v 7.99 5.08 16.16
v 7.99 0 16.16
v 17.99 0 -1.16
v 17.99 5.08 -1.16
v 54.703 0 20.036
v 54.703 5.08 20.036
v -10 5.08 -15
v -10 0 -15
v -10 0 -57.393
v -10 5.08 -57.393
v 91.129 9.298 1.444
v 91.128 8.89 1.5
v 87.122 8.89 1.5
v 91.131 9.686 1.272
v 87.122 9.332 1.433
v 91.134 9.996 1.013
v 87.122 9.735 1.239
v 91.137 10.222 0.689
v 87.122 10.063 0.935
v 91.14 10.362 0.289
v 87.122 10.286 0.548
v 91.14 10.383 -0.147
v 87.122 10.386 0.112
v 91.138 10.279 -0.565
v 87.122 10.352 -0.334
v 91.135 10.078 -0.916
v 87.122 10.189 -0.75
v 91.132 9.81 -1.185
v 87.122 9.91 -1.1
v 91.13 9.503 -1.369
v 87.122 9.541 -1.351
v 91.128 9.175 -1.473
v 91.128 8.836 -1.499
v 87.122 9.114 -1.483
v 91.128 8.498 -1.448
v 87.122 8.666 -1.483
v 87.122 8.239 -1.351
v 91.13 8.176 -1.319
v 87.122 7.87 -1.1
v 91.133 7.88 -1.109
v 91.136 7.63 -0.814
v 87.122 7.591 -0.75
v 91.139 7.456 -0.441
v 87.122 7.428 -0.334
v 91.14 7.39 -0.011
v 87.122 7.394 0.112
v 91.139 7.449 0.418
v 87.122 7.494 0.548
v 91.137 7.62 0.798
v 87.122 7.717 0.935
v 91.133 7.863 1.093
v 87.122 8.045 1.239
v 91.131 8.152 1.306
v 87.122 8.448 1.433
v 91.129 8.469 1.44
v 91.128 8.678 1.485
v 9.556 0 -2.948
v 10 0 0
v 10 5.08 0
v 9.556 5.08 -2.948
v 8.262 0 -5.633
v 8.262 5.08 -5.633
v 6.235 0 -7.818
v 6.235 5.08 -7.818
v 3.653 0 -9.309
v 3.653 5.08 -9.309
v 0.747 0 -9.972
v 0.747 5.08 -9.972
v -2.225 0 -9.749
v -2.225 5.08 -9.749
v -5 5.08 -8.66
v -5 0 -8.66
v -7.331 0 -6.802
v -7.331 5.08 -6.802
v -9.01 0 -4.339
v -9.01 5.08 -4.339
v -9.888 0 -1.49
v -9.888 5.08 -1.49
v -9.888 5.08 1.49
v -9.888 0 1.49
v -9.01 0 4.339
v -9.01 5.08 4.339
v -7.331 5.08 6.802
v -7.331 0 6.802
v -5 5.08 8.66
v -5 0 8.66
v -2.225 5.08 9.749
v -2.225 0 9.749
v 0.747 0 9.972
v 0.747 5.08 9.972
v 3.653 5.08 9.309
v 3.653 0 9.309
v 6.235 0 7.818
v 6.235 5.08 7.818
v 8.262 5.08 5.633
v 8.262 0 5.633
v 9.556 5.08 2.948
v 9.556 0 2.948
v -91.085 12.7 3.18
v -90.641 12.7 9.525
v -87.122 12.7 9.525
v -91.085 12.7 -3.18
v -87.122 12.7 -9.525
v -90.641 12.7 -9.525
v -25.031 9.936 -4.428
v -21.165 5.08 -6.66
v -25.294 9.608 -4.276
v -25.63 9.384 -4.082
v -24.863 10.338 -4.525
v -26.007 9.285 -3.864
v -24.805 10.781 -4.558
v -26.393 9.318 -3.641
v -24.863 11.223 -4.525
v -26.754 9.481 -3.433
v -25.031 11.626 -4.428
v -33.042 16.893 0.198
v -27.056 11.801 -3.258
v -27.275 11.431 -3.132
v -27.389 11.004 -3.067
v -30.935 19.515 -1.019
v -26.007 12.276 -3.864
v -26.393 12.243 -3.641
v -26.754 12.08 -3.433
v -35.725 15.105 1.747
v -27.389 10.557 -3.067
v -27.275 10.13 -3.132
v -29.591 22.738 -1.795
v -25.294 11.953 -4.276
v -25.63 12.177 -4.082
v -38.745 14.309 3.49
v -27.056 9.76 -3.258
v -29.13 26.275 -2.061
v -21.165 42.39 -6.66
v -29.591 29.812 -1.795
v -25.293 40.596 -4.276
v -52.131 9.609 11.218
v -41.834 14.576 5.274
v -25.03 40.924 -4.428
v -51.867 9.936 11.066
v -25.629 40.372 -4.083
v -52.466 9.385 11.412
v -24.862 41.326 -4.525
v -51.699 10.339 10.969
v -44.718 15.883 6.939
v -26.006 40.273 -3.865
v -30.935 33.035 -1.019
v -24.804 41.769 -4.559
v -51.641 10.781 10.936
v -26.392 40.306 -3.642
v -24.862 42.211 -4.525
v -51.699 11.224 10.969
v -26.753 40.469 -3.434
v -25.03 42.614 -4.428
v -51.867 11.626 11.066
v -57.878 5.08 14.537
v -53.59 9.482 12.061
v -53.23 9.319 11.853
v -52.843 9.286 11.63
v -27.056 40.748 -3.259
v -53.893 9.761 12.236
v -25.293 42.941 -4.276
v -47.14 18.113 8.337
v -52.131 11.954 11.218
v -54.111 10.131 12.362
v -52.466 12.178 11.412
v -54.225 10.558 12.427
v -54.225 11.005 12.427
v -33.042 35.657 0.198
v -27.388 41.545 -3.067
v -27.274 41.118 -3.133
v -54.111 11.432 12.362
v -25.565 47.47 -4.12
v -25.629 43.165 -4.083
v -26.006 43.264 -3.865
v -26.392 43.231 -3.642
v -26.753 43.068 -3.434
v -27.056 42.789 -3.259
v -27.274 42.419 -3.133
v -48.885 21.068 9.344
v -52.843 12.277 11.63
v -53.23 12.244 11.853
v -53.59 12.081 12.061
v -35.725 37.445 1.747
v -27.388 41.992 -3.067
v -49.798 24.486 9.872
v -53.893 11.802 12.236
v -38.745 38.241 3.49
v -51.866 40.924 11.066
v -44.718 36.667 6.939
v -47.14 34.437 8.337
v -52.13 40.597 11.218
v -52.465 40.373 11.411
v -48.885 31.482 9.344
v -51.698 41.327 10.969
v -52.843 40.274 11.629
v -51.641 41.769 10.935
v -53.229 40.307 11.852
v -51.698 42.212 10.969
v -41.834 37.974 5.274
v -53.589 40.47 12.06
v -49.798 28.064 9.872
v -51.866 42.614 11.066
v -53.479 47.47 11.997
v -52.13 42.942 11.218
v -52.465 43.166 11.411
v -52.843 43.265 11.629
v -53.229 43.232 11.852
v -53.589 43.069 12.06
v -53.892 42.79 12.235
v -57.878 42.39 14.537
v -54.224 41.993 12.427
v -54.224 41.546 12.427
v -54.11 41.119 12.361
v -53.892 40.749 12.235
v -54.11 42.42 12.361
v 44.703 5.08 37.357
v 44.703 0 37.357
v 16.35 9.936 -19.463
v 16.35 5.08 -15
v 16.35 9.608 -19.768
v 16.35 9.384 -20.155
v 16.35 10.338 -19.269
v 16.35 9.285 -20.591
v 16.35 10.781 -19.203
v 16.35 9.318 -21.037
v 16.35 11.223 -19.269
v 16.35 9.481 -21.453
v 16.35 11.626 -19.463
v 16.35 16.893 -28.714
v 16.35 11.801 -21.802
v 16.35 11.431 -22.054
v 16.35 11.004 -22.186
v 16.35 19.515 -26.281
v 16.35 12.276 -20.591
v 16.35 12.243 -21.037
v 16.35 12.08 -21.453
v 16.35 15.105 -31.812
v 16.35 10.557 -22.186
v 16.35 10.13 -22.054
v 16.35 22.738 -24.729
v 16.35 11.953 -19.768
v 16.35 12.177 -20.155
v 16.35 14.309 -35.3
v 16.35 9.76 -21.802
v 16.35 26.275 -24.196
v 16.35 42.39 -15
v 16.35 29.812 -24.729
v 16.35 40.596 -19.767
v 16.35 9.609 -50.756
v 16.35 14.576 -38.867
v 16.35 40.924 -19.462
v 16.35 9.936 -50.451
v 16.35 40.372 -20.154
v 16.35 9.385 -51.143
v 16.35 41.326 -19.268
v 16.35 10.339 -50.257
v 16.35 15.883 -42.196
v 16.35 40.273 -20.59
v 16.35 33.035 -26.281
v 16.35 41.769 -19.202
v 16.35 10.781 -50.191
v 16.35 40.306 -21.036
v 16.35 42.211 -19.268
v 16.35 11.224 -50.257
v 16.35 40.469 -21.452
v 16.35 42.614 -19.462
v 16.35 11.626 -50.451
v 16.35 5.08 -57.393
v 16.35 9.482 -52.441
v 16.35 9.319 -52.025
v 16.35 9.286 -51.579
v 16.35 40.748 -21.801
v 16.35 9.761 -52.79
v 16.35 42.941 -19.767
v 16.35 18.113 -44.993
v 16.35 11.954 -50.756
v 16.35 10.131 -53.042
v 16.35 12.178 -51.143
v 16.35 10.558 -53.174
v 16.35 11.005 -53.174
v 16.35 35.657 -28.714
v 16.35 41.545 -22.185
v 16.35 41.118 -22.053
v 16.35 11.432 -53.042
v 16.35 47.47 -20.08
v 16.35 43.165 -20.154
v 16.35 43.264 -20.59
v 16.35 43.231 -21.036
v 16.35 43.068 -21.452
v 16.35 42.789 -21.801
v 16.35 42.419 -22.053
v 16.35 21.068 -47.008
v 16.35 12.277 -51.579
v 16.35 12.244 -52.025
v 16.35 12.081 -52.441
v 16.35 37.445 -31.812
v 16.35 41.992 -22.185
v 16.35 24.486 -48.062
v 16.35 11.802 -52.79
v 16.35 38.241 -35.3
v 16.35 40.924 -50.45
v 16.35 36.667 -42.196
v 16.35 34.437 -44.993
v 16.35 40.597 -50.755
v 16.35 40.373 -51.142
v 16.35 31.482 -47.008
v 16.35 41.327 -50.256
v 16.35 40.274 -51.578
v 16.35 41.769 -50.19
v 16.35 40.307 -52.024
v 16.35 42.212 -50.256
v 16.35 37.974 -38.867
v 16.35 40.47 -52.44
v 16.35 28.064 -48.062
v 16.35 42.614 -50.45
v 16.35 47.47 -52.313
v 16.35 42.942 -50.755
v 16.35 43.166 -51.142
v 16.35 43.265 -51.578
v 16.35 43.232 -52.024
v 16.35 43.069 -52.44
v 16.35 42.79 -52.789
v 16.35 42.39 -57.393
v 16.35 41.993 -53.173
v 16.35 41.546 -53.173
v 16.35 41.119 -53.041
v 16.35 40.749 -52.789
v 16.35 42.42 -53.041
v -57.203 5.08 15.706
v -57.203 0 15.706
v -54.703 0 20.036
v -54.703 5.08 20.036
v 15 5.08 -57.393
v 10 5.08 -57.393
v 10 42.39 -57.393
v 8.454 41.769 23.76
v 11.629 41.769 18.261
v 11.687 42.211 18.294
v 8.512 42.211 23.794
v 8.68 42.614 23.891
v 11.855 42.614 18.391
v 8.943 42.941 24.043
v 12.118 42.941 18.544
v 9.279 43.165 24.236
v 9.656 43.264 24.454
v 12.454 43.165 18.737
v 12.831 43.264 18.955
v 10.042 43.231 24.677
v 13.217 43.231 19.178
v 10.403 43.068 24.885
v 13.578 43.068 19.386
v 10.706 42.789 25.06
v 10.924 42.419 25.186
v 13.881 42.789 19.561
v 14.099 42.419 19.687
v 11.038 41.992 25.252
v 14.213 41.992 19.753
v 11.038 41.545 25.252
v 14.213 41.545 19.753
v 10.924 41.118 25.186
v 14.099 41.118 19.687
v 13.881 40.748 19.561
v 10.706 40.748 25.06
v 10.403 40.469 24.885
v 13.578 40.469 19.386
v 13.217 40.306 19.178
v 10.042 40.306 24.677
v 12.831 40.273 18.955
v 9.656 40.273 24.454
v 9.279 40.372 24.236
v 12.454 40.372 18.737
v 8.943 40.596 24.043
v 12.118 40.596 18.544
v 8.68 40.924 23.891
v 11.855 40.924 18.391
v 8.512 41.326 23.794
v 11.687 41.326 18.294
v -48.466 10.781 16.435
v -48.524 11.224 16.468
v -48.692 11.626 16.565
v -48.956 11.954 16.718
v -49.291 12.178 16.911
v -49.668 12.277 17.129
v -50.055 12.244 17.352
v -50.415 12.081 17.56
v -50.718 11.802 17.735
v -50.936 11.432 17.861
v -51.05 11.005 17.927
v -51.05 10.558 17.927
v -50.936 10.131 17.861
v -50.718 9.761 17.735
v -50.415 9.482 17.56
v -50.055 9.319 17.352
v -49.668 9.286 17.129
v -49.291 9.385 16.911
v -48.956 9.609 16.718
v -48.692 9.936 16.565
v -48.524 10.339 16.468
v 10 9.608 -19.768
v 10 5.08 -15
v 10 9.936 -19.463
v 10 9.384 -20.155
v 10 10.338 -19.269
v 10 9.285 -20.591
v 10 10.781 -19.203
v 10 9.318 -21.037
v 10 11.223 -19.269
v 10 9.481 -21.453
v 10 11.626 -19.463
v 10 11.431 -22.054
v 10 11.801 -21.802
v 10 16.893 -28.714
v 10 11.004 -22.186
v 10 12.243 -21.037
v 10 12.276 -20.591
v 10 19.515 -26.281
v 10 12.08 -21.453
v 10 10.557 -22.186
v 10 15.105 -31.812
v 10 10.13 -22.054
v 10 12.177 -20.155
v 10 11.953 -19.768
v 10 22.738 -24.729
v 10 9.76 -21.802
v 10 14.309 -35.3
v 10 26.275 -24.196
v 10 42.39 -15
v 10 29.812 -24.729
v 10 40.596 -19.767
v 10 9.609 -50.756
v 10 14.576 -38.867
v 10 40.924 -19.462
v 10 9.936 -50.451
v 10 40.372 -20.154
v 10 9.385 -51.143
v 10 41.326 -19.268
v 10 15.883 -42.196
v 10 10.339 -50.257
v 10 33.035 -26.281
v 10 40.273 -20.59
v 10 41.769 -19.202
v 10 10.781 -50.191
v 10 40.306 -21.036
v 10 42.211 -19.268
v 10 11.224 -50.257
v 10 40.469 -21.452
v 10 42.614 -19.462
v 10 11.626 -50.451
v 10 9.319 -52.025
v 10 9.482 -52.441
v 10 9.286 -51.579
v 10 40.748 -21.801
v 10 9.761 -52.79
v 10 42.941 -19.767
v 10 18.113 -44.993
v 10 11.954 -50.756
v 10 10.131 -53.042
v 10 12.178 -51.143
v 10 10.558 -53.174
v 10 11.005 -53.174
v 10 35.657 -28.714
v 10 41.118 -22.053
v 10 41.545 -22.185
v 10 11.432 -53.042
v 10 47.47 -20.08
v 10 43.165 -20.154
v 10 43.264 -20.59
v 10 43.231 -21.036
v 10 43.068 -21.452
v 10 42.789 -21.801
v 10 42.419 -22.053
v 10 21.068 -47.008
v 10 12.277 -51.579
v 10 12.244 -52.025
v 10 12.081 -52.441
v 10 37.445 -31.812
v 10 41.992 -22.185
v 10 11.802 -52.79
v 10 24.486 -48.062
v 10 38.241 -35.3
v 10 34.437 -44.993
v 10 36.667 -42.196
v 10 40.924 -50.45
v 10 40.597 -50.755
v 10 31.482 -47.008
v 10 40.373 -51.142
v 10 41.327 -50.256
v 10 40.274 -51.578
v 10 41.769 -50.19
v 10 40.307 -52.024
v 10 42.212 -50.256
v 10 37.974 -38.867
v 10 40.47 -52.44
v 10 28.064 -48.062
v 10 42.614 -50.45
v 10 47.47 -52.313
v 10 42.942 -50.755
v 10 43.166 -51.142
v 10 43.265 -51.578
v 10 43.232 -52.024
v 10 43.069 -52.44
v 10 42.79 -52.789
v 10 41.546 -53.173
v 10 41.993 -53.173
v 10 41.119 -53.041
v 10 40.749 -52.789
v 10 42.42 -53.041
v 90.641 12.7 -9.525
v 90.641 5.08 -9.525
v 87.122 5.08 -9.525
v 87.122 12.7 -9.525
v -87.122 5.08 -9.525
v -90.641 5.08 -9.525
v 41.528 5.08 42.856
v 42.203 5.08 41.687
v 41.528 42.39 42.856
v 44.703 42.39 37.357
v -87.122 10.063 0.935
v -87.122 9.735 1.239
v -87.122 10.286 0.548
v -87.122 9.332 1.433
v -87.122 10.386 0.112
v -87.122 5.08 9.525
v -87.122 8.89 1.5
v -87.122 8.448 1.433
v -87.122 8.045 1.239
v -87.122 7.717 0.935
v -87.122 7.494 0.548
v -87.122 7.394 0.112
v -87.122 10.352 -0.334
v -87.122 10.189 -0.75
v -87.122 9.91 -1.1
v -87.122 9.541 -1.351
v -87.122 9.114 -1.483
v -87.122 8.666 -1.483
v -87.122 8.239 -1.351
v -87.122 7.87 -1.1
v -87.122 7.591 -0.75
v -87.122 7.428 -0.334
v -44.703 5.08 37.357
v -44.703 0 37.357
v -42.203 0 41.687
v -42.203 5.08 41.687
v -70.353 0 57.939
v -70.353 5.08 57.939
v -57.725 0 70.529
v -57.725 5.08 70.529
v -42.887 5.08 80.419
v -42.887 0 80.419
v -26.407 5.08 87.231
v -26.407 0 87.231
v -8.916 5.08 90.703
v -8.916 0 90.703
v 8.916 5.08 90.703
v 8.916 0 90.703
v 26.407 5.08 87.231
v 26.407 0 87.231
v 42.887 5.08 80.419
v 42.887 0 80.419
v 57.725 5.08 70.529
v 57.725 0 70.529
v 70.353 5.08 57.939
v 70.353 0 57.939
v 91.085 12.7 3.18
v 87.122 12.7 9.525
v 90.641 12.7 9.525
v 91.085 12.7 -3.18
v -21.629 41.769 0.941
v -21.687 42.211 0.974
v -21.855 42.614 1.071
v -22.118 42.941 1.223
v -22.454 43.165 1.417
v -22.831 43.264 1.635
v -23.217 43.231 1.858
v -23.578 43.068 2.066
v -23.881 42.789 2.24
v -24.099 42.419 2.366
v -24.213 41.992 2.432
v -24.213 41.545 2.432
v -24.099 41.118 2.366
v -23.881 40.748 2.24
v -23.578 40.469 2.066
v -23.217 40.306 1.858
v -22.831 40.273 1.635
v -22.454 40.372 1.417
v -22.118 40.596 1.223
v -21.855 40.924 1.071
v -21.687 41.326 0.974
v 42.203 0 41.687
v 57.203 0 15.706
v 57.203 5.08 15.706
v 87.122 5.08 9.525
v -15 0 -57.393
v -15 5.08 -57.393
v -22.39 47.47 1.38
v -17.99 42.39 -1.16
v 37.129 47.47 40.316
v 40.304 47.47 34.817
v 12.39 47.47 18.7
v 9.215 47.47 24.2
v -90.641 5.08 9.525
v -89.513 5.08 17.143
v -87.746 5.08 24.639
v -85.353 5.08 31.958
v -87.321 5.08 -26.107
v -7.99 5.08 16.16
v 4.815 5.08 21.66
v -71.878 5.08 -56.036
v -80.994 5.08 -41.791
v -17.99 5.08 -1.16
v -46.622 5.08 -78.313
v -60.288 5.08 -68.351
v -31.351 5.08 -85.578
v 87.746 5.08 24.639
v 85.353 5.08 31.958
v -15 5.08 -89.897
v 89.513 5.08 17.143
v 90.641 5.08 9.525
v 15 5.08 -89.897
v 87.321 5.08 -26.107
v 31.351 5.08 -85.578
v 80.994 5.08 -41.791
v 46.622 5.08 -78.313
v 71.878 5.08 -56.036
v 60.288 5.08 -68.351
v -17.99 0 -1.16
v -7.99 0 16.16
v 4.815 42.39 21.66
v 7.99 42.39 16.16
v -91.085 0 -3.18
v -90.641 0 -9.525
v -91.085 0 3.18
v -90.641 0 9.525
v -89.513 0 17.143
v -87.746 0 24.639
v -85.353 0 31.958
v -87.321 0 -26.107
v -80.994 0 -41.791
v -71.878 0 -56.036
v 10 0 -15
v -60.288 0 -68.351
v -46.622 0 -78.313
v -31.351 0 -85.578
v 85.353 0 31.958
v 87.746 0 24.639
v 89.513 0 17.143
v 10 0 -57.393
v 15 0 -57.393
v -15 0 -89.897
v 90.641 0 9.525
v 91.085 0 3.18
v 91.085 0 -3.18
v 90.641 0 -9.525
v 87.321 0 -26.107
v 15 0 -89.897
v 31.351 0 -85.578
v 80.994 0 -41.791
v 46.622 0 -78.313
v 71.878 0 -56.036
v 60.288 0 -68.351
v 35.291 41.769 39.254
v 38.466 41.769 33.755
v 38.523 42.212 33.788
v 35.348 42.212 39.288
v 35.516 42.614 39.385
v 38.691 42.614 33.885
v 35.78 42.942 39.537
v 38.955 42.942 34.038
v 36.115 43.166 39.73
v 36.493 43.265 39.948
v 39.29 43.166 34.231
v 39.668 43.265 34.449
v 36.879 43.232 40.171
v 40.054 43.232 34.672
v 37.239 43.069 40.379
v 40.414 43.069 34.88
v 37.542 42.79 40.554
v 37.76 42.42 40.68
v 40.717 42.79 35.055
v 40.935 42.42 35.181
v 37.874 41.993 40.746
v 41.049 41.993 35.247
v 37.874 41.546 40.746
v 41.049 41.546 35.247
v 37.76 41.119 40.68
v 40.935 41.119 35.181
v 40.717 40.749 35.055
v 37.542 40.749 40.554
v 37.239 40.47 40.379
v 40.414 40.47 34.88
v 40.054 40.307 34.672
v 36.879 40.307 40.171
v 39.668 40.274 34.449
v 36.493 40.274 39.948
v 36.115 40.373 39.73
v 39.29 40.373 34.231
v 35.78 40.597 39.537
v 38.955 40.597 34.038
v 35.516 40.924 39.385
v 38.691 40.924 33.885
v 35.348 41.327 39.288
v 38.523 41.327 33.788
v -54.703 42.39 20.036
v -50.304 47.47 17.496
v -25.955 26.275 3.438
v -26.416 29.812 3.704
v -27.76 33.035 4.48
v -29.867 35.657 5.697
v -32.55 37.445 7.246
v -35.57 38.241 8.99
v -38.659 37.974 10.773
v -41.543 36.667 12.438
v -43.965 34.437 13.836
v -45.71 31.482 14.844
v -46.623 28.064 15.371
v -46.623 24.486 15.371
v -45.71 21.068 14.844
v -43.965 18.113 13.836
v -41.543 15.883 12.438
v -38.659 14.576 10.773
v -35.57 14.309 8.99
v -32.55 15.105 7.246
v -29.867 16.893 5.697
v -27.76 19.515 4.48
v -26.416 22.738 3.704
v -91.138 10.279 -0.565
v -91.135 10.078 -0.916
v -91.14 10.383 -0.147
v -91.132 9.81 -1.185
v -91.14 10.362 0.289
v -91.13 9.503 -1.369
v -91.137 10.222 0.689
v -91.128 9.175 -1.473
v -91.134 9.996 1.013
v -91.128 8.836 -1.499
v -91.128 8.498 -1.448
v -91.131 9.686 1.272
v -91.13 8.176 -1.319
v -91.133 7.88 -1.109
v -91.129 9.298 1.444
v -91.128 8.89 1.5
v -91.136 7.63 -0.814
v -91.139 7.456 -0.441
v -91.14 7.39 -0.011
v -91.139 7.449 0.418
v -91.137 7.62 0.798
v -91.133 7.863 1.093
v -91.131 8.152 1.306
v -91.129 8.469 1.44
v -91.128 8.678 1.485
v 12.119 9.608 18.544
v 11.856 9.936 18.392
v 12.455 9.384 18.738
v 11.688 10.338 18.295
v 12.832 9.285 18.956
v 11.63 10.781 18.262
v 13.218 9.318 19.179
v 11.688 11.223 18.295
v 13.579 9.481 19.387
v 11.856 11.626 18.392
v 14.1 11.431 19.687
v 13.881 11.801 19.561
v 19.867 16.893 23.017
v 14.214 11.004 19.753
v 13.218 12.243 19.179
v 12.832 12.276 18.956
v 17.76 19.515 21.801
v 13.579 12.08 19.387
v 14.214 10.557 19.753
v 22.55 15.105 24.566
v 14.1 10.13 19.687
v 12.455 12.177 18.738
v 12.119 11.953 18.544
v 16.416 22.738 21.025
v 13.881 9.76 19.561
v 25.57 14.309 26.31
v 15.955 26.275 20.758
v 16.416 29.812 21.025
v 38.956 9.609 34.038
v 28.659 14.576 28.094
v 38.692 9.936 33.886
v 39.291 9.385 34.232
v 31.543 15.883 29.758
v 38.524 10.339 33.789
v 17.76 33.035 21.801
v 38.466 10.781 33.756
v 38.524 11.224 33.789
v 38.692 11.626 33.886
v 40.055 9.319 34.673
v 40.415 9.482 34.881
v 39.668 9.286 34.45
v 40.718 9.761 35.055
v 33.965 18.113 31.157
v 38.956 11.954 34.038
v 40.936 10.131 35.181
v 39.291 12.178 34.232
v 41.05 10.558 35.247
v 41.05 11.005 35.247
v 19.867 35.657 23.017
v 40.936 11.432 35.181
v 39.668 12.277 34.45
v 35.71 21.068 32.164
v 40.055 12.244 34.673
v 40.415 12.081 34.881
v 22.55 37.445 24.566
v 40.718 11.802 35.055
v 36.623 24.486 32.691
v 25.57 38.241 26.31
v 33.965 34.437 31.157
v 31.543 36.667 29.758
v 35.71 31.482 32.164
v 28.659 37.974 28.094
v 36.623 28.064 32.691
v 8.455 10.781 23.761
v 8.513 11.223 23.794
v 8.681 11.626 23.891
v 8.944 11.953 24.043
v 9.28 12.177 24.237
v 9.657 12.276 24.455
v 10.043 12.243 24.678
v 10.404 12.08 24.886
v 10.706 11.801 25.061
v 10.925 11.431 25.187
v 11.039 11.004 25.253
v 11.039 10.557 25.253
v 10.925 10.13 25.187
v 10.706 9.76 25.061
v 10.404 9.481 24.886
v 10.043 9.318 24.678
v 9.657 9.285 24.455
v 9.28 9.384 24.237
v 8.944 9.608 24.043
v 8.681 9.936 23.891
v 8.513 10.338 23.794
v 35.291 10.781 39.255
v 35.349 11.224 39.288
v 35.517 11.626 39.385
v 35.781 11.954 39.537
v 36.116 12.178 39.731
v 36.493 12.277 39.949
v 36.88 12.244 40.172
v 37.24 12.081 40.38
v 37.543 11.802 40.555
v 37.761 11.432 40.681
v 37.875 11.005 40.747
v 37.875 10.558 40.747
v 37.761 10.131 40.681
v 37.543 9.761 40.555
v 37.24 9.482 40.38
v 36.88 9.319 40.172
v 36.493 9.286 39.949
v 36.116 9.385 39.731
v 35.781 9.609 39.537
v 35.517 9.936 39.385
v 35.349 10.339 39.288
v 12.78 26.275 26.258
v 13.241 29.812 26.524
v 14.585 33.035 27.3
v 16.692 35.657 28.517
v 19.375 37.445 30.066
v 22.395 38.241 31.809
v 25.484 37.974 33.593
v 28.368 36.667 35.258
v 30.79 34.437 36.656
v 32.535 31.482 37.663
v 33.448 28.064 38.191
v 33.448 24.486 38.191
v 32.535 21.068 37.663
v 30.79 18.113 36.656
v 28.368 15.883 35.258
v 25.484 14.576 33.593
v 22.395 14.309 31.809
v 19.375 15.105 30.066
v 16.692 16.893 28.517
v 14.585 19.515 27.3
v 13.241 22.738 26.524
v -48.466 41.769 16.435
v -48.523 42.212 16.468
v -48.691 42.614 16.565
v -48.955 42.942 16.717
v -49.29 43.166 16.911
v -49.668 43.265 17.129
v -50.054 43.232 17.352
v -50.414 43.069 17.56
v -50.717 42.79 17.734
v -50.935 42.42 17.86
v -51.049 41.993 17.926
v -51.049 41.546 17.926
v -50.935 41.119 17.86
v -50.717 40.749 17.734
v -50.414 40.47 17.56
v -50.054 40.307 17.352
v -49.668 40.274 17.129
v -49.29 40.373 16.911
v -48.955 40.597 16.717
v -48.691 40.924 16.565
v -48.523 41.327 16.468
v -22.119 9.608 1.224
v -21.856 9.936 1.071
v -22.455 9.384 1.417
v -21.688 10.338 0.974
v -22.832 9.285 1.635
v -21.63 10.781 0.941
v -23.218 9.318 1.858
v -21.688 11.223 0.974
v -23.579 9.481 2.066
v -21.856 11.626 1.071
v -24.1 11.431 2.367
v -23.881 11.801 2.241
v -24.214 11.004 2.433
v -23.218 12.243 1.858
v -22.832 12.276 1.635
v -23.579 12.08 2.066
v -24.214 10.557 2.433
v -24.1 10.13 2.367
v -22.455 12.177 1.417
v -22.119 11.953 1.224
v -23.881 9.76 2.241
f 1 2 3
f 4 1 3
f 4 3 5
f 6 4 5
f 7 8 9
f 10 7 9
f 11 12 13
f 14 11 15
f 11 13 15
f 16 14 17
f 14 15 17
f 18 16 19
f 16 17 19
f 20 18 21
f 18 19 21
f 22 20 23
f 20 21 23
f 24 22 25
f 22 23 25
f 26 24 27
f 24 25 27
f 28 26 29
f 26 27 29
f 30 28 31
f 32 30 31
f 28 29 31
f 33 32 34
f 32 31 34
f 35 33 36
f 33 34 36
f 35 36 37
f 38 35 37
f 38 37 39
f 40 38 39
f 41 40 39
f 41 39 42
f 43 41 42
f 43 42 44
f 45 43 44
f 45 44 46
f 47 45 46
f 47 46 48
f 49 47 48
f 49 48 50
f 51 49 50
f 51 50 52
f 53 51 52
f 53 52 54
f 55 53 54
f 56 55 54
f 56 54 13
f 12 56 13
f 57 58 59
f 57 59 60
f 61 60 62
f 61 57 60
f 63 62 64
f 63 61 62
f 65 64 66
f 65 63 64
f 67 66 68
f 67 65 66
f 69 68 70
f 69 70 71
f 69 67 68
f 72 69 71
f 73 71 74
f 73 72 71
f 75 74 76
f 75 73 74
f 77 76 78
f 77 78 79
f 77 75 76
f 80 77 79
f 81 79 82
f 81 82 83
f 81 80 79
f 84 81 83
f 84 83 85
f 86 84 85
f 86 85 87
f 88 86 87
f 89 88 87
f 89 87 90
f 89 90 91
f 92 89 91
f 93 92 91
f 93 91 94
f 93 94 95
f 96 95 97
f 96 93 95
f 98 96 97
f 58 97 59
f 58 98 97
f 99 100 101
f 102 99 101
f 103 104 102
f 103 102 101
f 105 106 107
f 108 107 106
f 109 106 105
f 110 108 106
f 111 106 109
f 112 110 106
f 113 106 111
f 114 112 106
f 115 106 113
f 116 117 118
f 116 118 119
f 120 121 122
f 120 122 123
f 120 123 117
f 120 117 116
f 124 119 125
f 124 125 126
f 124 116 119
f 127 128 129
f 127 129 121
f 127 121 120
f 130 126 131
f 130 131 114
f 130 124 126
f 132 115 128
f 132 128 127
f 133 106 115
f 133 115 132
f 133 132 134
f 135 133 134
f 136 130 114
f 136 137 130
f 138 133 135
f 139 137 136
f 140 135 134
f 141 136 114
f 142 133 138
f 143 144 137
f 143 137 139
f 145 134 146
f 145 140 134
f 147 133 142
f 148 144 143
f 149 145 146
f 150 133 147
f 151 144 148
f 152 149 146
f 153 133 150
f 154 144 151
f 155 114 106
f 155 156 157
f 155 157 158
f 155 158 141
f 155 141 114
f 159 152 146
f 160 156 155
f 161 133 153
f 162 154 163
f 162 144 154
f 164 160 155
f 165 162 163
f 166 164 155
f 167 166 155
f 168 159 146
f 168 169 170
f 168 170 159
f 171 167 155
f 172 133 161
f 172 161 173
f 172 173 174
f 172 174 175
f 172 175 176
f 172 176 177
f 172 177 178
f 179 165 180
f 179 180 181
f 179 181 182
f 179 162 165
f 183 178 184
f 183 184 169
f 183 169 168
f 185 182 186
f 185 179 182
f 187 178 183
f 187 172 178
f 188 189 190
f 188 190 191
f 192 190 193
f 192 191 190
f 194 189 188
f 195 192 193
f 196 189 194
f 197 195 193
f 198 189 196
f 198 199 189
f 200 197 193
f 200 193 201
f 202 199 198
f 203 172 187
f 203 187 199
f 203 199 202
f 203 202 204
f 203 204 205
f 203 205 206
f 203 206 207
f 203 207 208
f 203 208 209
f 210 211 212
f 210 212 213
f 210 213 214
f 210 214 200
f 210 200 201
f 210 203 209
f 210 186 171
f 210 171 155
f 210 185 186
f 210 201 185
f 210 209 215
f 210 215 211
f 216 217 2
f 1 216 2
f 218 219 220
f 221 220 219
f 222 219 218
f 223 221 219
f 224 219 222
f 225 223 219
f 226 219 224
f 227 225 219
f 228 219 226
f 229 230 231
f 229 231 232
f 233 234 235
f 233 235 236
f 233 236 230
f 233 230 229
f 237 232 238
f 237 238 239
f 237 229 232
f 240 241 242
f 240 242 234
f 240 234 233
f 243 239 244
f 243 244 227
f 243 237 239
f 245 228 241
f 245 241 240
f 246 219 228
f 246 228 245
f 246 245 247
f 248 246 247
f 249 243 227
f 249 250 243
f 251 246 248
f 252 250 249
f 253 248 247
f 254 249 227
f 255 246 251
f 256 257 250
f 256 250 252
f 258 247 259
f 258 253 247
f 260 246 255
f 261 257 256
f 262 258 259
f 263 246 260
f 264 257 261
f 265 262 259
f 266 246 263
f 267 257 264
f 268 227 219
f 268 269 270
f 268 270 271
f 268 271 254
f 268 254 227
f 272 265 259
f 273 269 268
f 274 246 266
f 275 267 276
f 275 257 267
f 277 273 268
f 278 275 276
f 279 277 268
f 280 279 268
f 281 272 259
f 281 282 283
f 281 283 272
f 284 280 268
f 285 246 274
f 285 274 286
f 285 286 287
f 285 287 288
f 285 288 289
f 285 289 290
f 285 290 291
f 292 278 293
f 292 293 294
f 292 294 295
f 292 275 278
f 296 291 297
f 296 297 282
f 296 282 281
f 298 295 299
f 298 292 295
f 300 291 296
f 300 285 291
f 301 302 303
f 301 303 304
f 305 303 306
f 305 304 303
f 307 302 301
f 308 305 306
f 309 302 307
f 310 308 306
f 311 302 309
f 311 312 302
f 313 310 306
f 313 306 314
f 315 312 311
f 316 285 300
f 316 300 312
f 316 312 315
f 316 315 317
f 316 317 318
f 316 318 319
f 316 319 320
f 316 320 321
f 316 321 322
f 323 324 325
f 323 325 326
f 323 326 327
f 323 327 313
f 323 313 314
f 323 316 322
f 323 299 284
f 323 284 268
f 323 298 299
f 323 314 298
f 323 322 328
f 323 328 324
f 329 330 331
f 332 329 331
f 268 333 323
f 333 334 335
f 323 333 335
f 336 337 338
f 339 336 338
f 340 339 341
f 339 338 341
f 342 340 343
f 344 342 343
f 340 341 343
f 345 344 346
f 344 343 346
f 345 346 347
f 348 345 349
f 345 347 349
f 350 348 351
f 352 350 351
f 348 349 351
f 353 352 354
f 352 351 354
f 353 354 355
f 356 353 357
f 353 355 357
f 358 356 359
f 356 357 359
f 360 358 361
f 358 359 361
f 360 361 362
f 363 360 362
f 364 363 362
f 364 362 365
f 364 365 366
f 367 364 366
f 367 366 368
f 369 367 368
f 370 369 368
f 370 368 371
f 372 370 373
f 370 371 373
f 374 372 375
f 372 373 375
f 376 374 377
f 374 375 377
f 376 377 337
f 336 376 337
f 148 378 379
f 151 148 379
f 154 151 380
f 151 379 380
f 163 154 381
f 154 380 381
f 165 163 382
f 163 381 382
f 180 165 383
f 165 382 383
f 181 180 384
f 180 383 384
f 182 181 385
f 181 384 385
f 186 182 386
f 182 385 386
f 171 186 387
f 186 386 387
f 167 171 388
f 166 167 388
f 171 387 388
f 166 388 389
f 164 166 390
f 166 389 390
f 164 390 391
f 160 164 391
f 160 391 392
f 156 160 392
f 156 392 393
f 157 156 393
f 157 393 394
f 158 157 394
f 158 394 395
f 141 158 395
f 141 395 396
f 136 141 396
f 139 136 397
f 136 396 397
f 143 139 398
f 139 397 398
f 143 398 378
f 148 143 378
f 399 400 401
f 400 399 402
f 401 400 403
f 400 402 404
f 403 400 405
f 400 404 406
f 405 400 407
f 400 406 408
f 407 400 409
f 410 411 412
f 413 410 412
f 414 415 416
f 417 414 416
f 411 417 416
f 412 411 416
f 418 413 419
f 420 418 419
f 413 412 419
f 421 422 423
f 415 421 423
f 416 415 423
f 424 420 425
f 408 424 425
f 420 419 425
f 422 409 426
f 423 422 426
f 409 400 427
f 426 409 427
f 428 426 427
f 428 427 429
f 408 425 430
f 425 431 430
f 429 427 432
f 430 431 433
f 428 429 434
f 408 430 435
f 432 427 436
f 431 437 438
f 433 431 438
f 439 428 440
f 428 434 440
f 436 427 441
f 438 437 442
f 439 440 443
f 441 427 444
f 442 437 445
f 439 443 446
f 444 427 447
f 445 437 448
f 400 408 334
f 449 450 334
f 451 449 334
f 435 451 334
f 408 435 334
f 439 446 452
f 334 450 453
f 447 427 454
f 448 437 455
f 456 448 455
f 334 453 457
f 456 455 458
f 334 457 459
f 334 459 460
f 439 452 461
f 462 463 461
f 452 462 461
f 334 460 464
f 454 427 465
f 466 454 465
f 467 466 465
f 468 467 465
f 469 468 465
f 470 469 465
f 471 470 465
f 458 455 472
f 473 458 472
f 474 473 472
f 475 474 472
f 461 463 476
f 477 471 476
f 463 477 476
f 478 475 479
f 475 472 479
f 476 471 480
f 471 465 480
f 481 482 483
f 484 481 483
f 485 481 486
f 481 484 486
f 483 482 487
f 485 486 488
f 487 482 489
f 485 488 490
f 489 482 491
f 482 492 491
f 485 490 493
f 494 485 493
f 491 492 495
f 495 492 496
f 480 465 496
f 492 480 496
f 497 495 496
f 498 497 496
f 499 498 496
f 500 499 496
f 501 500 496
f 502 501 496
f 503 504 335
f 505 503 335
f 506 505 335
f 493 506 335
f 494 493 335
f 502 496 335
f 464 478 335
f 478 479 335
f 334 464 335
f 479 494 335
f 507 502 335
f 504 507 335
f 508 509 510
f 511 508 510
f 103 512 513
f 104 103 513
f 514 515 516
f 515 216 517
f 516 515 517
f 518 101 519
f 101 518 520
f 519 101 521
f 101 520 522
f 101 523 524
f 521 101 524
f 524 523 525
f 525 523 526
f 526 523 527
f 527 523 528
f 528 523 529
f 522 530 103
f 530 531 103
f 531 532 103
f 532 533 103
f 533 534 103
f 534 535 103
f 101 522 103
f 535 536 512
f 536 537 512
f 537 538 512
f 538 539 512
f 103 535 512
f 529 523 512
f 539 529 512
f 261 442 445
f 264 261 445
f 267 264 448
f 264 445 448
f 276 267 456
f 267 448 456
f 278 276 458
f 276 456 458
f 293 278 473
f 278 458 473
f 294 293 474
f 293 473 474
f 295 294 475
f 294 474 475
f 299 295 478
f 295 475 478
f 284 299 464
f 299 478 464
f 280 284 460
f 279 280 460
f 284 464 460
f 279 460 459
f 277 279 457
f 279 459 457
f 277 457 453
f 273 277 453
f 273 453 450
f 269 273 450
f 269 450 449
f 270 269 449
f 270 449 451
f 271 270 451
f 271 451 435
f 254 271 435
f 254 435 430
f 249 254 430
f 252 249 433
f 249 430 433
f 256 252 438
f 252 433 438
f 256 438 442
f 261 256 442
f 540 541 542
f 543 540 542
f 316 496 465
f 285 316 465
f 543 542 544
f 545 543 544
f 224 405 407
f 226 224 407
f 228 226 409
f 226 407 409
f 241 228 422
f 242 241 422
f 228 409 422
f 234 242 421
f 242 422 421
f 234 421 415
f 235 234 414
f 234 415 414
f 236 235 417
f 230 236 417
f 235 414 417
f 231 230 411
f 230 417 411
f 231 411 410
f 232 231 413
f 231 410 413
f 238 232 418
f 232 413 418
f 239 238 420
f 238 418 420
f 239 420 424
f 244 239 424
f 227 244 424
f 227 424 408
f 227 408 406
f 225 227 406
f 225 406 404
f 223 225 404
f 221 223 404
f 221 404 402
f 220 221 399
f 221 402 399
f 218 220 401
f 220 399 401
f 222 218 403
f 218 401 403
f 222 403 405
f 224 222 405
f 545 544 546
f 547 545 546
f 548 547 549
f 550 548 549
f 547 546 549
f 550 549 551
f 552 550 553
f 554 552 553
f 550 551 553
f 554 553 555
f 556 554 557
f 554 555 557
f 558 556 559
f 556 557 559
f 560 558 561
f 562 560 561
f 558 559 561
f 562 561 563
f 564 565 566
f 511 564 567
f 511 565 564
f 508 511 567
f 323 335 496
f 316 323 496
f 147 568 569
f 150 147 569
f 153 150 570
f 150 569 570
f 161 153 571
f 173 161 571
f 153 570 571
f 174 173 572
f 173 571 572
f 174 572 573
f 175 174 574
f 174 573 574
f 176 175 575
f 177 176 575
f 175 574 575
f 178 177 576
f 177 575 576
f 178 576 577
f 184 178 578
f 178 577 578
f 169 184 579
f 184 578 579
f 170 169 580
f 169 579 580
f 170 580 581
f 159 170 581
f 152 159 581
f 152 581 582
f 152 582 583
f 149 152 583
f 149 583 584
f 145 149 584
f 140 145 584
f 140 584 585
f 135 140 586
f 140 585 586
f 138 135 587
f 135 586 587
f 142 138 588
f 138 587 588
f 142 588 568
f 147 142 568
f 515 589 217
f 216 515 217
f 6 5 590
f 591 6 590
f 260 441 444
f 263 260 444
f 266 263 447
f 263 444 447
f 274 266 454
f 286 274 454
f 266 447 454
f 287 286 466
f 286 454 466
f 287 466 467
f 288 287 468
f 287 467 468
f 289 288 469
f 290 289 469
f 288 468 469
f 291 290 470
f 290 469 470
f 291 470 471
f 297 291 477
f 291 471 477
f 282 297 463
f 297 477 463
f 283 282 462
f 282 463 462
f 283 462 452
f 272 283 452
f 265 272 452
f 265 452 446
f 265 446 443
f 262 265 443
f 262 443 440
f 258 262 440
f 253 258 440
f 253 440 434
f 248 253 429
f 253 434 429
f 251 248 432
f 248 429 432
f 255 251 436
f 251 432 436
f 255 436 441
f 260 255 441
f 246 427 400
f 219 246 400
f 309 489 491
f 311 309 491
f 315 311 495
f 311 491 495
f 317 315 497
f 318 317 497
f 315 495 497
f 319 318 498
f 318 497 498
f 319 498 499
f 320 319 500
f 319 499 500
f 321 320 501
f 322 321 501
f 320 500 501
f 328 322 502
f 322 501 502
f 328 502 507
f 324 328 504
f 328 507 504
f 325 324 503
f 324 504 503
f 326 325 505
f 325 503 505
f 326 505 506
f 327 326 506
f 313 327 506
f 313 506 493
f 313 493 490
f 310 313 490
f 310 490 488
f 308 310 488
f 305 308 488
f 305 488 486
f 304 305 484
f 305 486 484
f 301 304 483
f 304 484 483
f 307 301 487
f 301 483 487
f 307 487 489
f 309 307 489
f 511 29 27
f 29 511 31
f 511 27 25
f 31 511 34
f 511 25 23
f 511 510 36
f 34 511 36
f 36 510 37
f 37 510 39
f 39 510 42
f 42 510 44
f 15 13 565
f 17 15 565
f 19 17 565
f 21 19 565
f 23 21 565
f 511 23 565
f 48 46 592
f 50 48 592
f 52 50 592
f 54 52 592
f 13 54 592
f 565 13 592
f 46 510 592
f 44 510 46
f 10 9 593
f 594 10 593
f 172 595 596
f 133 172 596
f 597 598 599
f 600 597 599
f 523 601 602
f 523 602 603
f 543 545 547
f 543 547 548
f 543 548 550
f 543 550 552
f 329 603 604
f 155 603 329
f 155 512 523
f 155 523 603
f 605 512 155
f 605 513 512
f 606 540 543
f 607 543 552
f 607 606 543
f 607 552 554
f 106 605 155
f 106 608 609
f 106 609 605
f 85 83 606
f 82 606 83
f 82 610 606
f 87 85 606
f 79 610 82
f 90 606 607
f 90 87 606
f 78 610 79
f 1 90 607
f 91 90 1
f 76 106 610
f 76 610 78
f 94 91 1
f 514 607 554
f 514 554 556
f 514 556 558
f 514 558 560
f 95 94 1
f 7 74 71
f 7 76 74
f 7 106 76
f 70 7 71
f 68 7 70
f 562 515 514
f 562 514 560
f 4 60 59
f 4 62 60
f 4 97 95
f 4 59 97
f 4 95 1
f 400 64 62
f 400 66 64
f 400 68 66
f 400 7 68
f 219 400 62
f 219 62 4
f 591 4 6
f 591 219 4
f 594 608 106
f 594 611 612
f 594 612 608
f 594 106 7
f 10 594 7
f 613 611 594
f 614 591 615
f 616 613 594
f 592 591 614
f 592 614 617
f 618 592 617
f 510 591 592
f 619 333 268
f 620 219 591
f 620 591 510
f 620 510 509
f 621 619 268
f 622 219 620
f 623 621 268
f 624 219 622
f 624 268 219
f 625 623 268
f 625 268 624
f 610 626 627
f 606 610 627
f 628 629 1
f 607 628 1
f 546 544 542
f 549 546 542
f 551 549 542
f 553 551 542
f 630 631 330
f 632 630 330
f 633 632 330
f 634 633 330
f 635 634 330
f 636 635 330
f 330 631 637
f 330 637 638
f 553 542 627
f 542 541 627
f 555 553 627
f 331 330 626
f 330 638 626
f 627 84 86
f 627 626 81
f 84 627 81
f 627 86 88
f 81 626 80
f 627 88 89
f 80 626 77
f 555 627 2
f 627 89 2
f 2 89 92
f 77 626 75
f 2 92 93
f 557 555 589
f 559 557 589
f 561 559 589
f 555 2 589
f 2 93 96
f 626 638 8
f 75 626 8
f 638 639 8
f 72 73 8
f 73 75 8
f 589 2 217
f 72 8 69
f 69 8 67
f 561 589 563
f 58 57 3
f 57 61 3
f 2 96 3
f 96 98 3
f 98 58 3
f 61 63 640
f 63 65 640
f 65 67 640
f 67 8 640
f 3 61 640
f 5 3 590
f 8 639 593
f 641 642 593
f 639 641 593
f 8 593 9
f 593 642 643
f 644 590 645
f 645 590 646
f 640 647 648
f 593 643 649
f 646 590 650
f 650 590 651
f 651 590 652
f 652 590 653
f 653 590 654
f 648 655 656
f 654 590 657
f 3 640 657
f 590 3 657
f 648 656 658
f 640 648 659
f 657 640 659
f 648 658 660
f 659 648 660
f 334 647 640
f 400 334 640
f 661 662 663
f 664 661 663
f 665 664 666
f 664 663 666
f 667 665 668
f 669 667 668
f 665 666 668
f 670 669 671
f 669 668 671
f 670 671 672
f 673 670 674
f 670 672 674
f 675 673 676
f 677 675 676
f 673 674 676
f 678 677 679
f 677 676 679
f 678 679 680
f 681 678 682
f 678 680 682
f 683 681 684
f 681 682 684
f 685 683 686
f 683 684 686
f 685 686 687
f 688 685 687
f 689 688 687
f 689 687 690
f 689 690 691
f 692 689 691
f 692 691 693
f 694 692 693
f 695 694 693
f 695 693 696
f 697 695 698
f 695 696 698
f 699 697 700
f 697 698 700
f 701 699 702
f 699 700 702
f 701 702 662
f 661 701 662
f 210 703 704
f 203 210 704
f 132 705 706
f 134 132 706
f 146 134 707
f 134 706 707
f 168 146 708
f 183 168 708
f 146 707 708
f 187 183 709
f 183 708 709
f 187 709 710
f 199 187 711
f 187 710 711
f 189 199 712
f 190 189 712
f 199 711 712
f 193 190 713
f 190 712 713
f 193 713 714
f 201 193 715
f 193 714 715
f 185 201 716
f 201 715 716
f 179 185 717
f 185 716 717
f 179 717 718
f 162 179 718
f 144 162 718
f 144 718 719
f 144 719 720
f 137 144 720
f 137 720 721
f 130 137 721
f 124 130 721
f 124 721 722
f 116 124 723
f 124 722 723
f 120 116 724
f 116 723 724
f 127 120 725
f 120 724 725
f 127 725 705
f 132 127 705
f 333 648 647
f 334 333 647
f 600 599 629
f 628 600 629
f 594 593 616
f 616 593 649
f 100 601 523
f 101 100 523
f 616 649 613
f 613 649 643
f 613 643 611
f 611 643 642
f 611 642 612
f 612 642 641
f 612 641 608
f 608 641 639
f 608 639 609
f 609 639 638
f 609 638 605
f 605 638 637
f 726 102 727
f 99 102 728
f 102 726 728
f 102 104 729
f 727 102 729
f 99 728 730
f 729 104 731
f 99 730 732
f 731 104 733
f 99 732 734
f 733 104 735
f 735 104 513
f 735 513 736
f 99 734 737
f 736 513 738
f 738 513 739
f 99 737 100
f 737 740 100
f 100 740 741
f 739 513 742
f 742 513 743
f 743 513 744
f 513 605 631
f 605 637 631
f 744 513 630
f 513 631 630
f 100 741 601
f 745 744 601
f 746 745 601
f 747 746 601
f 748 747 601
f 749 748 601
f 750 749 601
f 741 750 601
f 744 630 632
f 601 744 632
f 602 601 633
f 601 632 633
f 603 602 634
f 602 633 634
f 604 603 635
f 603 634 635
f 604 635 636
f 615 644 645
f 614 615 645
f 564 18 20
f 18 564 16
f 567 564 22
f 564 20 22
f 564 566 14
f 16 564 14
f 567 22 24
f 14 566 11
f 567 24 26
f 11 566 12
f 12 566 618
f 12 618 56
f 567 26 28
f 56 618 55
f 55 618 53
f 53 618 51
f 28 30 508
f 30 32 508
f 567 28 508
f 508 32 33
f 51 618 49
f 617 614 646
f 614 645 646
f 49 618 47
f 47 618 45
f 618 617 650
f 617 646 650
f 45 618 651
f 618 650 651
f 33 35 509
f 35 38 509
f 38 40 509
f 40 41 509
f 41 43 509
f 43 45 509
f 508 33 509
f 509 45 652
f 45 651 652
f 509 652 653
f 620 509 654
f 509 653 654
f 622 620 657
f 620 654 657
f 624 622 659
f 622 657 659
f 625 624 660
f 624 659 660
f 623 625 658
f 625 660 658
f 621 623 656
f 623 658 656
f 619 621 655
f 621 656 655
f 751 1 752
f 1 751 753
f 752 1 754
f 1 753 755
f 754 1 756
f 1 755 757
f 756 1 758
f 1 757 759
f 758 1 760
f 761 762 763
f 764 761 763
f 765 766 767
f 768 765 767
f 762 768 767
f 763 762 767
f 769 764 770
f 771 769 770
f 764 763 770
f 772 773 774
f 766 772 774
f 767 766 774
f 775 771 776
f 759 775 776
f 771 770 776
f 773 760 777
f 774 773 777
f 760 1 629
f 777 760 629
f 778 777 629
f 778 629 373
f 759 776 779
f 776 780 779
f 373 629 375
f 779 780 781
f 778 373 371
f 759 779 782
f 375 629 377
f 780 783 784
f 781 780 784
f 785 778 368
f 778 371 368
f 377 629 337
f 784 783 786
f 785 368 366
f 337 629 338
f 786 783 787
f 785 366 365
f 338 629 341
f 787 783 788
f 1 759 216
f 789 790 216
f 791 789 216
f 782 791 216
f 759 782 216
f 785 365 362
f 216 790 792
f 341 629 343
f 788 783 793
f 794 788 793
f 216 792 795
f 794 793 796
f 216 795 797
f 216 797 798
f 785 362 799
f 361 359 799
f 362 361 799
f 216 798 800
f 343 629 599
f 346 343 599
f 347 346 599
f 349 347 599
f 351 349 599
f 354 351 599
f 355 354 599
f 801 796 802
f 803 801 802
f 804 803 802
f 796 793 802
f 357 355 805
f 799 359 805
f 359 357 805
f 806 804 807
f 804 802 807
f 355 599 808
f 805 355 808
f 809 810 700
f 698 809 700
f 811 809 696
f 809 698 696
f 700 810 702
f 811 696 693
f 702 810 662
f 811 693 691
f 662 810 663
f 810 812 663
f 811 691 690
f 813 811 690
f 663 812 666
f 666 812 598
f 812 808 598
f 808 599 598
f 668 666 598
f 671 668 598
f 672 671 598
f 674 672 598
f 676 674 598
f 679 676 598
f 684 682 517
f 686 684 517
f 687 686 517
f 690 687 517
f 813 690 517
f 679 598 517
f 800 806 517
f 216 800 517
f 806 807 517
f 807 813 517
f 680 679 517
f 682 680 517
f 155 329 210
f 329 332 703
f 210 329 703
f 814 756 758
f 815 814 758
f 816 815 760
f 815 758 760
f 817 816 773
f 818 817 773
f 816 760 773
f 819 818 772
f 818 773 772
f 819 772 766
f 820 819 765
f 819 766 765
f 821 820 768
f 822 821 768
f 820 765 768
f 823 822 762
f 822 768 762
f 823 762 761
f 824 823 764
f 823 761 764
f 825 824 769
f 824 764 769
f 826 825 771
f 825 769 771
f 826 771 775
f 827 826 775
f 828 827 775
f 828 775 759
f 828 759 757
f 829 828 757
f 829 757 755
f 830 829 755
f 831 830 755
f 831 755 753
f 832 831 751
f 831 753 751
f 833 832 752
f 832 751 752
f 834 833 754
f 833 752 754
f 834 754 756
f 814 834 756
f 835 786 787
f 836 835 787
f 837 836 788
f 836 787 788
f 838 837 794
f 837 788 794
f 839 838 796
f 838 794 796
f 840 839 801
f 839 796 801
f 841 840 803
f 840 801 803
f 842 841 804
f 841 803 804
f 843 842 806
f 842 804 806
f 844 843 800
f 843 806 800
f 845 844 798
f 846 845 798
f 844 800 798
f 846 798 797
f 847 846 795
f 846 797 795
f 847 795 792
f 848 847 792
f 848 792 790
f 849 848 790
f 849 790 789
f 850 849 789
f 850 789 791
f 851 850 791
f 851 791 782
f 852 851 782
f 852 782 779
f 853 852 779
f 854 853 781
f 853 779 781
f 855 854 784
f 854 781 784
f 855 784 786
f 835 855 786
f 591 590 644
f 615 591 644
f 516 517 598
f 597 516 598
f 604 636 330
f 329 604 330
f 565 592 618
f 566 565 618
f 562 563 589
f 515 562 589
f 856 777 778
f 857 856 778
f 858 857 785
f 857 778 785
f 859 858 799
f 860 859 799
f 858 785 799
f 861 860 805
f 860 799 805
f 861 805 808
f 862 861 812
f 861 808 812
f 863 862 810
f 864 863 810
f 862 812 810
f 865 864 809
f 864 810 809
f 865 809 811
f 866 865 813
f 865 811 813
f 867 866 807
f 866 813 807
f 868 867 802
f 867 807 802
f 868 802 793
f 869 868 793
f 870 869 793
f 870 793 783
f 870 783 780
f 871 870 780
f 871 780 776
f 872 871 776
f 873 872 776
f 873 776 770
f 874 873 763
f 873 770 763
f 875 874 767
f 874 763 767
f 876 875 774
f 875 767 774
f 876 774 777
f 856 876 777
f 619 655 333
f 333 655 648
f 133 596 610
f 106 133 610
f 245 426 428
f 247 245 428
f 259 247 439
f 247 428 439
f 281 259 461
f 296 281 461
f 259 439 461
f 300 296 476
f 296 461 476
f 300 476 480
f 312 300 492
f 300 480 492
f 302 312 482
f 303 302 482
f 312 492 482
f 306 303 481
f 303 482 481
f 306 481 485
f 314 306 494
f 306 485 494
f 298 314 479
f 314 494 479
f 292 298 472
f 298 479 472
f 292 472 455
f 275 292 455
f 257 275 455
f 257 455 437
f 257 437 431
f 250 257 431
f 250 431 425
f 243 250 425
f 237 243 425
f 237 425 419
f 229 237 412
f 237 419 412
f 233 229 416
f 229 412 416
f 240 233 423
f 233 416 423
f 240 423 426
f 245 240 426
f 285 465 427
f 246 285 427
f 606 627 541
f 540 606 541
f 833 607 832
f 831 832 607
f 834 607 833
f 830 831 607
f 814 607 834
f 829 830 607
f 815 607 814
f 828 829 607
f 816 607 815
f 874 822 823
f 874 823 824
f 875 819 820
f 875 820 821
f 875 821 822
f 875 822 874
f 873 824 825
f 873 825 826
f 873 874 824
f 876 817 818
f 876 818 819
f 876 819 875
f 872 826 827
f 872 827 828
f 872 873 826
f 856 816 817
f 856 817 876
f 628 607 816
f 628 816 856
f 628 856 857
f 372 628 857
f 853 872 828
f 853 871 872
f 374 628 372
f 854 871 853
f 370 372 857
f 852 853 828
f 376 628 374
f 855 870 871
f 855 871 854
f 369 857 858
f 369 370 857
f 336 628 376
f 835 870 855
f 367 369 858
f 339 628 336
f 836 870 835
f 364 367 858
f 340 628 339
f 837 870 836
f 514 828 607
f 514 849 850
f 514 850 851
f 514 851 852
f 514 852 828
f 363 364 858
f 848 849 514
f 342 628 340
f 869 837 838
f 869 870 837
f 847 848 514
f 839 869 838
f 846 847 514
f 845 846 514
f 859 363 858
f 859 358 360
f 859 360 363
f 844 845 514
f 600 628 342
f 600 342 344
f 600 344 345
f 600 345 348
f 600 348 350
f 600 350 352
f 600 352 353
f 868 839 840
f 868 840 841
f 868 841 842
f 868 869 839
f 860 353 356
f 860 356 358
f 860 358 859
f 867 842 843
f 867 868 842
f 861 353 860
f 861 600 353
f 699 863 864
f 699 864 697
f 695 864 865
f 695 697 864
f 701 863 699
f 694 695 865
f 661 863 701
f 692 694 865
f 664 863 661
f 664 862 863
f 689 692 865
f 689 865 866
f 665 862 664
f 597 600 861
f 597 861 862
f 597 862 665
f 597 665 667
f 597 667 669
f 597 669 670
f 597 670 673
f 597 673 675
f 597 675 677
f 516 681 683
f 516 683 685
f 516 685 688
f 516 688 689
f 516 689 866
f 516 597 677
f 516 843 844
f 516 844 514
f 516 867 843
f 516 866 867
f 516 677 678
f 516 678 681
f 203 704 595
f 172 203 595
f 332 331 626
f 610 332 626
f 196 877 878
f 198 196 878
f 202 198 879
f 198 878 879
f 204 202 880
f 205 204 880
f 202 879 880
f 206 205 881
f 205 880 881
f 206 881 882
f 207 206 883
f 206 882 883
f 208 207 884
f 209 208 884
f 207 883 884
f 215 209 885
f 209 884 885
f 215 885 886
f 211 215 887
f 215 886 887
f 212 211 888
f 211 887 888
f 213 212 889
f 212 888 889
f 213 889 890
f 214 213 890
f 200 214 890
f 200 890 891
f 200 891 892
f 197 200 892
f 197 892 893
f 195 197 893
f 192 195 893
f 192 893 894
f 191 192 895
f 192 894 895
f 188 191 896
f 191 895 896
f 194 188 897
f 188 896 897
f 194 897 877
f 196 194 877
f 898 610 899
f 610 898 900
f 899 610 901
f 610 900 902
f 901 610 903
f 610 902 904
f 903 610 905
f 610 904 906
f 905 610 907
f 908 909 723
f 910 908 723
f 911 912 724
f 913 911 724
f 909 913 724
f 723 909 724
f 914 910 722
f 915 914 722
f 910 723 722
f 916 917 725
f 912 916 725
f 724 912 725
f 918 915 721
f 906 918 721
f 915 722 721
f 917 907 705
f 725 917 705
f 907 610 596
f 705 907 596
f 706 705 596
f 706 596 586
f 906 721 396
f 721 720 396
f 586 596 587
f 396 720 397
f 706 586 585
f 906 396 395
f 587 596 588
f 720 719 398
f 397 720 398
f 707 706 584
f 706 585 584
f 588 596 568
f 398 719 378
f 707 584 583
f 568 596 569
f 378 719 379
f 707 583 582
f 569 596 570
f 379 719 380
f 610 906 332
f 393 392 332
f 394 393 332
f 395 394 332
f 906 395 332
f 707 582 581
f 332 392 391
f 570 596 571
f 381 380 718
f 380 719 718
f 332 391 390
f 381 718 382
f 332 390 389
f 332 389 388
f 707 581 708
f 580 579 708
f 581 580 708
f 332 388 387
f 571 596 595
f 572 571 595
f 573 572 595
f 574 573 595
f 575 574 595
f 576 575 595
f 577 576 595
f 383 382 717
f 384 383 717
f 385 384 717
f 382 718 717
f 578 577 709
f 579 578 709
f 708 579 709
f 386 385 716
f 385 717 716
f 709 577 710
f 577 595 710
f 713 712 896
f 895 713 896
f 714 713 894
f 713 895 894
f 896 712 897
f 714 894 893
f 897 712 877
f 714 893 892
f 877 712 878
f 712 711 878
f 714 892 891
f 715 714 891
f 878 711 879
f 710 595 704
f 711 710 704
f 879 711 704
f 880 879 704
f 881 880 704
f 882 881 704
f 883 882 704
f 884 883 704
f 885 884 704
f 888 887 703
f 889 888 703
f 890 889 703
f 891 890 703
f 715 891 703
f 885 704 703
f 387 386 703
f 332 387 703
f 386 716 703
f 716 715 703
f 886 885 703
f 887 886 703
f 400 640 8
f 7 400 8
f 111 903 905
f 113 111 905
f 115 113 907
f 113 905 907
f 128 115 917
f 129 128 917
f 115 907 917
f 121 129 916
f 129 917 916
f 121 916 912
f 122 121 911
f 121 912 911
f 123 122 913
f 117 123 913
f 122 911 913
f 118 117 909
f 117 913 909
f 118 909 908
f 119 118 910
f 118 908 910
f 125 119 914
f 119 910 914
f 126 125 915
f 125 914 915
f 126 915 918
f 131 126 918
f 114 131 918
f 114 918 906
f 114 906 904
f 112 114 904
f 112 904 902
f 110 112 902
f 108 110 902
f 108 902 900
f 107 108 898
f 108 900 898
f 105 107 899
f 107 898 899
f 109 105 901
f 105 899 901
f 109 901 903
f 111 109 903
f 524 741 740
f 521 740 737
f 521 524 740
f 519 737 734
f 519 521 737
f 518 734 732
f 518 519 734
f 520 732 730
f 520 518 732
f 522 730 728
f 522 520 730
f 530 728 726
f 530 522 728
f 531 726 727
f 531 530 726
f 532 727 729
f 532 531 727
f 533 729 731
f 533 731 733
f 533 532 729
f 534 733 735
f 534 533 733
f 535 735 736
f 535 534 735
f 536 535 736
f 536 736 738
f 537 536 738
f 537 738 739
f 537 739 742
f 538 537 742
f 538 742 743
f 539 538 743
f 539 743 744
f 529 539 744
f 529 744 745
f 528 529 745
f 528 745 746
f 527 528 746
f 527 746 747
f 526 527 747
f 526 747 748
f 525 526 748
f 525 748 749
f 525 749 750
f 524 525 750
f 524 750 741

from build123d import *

# Parameters (mm, degrees)
SKETCH1_R           = 10
BASE_DEPTH          = 5.08
SKETCH2_R           = 12
SKETCH2_R_2         = 1.5
MOTOREXTRUDE_DEPTH  = 6.35
CIRPATTERN3_COUNT   = 3
CIRPATTERN3_ANGLE   = 240
BOSS_EXTRUDE1_DEPTH = 12.7
SKETCH3_R           = 1.5
CUT_EXTRUDE1_DEPTH  = 5.018


with BuildPart() as part:
    # Sketch1 → Base (new body)
    with BuildSketch(Plane(origin=(0, 0, 0), x_dir=(1, 0, 0), z_dir=(0, 1, 0))):
        with BuildLine():
            Line((-10, 15), (-10, 57.3926))
            Line((-10, 57.3926), (-15, 57.3926))
            Line((-15, 57.3926), (-15, 89.897161246))
            ThreePointArc((-15, 89.897161246), (-78.929555301, 45.57), (-85.353225367, -31.958199566))
            Line((-85.353225367, -31.958199566), (-57.203449589, -15.705918943))
            Line((-57.203449589, -15.705918943), (-54.703449589, -20.036045962))
            Line((-54.703449589, -20.036045962), (-17.990381057, 1.160254038))
            Line((-17.990381057, 1.160254038), (-7.990381057, -16.160254038))
            Line((-7.990381057, -16.160254038), (-44.703449589, -37.356554038))
            Line((-44.703449589, -37.356554038), (-42.203449589, -41.686681057))
            Line((-42.203449589, -41.686681057), (-70.353225367, -57.93896168))
            ThreePointArc((-70.353225367, -57.93896168), (0, -91.14), (70.353225367, -57.93896168))
            Line((70.353225367, -57.93896168), (42.203449589, -41.686681057))
            Line((42.203449589, -41.686681057), (44.703449589, -37.356554038))
            Line((44.703449589, -37.356554038), (7.990381057, -16.160254038))
            Line((7.990381057, -16.160254038), (17.990381057, 1.160254038))
            Line((17.990381057, 1.160254038), (54.703449589, -20.036045962))
            Line((54.703449589, -20.036045962), (57.203449589, -15.705918943))
            Line((57.203449589, -15.705918943), (85.353225367, -31.958199566))
            ThreePointArc((85.353225367, -31.958199566), (78.929555301, 45.57), (15, 89.897161246))
            Line((15, 89.897161246), (15, 57.3926))
            Line((15, 57.3926), (10, 57.3926))
            Line((10, 57.3926), (10, 15))
            Line((10, 15), (-10, 15))
        make_face()
        Circle(SKETCH1_R, mode=Mode.SUBTRACT)
    extrude(amount=BASE_DEPTH)

    # Sketch2 → MotorExtrude (add)
    with BuildSketch(Plane(origin=(-5, 0, 8.660254038), x_dir=(-0.866025404, 0, -0.5), z_dir=(0.5, 0, -0.866025404))):
        Polygon((-15, 5.08), (-57.3926, 5.08), (-57.3926, 42.39), (-52.3126, 47.47), (-20.08, 47.47), (-15, 42.39), align=None)
        with Locations((-36.1963, 26.275)):
            Circle(SKETCH2_R, mode=Mode.SUBTRACT)
        with Locations((-20.701824858, 41.768524843)):
            Circle(SKETCH2_R_2, mode=Mode.SUBTRACT)
        with Locations((-20.702775157, 10.780524858)):
            Circle(SKETCH2_R_2, mode=Mode.SUBTRACT)
        with Locations((-51.690775142, 10.781475157)):
            Circle(SKETCH2_R_2, mode=Mode.SUBTRACT)
        with Locations((-51.689824843, 41.769475142)):
            Circle(SKETCH2_R_2, mode=Mode.SUBTRACT)
    motorextrude = extrude(amount=-MOTOREXTRUDE_DEPTH)

    # CirPattern3: MotorExtrude ×3 about axis
    cirpattern3_axis = Axis((0, 0, 0), (0, 1, 0))
    for i in range(1, CIRPATTERN3_COUNT):
        add(motorextrude.rotate(cirpattern3_axis, i * CIRPATTERN3_ANGLE / (CIRPATTERN3_COUNT - 1)))

    # Sketch1<7> → Boss-Extrude1 (add)
    with BuildSketch(Plane(origin=(0, 0, 0), x_dir=(1, 0, 0), z_dir=(0, 1, 0))):
        with BuildLine():
            Line((-87.122, 9.525), (-90.640906742, 9.525))
            ThreePointArc((-90.640906742, 9.525), (-91.14, 0), (-90.640906742, -9.525))
            Line((-90.640906742, -9.525), (-87.122, -9.525))
            Line((-87.122, -9.525), (-87.122, 9.525))
        make_face()
        with BuildLine():
            Line((87.122, 9.525), (87.122, -9.525))
            Line((87.122, -9.525), (90.640906742, -9.525))
            ThreePointArc((90.640906742, -9.525), (91.14, 0), (90.640906742, 9.525))
            Line((90.640906742, 9.525), (87.122, 9.525))
        make_face()
    extrude(amount=BOSS_EXTRUDE1_DEPTH)

    # Sketch3 → Cut-Extrude1 (cut, through all)
    with BuildSketch(Plane.ZY.offset(-87.122)):
        with Locations((0, 8.89)):
            Circle(SKETCH3_R)
    cut_extrude1 = extrude(amount=-CUT_EXTRUDE1_DEPTH, mode=Mode.SUBTRACT)

    # Mirror1: Cut-Extrude1 across plane
    add(cut_extrude1.mirror(Plane(origin=(0, 0, 0), x_dir=(0, 0, 1), z_dir=(1, 0, 0))), mode=Mode.SUBTRACT)


solid = part.part
